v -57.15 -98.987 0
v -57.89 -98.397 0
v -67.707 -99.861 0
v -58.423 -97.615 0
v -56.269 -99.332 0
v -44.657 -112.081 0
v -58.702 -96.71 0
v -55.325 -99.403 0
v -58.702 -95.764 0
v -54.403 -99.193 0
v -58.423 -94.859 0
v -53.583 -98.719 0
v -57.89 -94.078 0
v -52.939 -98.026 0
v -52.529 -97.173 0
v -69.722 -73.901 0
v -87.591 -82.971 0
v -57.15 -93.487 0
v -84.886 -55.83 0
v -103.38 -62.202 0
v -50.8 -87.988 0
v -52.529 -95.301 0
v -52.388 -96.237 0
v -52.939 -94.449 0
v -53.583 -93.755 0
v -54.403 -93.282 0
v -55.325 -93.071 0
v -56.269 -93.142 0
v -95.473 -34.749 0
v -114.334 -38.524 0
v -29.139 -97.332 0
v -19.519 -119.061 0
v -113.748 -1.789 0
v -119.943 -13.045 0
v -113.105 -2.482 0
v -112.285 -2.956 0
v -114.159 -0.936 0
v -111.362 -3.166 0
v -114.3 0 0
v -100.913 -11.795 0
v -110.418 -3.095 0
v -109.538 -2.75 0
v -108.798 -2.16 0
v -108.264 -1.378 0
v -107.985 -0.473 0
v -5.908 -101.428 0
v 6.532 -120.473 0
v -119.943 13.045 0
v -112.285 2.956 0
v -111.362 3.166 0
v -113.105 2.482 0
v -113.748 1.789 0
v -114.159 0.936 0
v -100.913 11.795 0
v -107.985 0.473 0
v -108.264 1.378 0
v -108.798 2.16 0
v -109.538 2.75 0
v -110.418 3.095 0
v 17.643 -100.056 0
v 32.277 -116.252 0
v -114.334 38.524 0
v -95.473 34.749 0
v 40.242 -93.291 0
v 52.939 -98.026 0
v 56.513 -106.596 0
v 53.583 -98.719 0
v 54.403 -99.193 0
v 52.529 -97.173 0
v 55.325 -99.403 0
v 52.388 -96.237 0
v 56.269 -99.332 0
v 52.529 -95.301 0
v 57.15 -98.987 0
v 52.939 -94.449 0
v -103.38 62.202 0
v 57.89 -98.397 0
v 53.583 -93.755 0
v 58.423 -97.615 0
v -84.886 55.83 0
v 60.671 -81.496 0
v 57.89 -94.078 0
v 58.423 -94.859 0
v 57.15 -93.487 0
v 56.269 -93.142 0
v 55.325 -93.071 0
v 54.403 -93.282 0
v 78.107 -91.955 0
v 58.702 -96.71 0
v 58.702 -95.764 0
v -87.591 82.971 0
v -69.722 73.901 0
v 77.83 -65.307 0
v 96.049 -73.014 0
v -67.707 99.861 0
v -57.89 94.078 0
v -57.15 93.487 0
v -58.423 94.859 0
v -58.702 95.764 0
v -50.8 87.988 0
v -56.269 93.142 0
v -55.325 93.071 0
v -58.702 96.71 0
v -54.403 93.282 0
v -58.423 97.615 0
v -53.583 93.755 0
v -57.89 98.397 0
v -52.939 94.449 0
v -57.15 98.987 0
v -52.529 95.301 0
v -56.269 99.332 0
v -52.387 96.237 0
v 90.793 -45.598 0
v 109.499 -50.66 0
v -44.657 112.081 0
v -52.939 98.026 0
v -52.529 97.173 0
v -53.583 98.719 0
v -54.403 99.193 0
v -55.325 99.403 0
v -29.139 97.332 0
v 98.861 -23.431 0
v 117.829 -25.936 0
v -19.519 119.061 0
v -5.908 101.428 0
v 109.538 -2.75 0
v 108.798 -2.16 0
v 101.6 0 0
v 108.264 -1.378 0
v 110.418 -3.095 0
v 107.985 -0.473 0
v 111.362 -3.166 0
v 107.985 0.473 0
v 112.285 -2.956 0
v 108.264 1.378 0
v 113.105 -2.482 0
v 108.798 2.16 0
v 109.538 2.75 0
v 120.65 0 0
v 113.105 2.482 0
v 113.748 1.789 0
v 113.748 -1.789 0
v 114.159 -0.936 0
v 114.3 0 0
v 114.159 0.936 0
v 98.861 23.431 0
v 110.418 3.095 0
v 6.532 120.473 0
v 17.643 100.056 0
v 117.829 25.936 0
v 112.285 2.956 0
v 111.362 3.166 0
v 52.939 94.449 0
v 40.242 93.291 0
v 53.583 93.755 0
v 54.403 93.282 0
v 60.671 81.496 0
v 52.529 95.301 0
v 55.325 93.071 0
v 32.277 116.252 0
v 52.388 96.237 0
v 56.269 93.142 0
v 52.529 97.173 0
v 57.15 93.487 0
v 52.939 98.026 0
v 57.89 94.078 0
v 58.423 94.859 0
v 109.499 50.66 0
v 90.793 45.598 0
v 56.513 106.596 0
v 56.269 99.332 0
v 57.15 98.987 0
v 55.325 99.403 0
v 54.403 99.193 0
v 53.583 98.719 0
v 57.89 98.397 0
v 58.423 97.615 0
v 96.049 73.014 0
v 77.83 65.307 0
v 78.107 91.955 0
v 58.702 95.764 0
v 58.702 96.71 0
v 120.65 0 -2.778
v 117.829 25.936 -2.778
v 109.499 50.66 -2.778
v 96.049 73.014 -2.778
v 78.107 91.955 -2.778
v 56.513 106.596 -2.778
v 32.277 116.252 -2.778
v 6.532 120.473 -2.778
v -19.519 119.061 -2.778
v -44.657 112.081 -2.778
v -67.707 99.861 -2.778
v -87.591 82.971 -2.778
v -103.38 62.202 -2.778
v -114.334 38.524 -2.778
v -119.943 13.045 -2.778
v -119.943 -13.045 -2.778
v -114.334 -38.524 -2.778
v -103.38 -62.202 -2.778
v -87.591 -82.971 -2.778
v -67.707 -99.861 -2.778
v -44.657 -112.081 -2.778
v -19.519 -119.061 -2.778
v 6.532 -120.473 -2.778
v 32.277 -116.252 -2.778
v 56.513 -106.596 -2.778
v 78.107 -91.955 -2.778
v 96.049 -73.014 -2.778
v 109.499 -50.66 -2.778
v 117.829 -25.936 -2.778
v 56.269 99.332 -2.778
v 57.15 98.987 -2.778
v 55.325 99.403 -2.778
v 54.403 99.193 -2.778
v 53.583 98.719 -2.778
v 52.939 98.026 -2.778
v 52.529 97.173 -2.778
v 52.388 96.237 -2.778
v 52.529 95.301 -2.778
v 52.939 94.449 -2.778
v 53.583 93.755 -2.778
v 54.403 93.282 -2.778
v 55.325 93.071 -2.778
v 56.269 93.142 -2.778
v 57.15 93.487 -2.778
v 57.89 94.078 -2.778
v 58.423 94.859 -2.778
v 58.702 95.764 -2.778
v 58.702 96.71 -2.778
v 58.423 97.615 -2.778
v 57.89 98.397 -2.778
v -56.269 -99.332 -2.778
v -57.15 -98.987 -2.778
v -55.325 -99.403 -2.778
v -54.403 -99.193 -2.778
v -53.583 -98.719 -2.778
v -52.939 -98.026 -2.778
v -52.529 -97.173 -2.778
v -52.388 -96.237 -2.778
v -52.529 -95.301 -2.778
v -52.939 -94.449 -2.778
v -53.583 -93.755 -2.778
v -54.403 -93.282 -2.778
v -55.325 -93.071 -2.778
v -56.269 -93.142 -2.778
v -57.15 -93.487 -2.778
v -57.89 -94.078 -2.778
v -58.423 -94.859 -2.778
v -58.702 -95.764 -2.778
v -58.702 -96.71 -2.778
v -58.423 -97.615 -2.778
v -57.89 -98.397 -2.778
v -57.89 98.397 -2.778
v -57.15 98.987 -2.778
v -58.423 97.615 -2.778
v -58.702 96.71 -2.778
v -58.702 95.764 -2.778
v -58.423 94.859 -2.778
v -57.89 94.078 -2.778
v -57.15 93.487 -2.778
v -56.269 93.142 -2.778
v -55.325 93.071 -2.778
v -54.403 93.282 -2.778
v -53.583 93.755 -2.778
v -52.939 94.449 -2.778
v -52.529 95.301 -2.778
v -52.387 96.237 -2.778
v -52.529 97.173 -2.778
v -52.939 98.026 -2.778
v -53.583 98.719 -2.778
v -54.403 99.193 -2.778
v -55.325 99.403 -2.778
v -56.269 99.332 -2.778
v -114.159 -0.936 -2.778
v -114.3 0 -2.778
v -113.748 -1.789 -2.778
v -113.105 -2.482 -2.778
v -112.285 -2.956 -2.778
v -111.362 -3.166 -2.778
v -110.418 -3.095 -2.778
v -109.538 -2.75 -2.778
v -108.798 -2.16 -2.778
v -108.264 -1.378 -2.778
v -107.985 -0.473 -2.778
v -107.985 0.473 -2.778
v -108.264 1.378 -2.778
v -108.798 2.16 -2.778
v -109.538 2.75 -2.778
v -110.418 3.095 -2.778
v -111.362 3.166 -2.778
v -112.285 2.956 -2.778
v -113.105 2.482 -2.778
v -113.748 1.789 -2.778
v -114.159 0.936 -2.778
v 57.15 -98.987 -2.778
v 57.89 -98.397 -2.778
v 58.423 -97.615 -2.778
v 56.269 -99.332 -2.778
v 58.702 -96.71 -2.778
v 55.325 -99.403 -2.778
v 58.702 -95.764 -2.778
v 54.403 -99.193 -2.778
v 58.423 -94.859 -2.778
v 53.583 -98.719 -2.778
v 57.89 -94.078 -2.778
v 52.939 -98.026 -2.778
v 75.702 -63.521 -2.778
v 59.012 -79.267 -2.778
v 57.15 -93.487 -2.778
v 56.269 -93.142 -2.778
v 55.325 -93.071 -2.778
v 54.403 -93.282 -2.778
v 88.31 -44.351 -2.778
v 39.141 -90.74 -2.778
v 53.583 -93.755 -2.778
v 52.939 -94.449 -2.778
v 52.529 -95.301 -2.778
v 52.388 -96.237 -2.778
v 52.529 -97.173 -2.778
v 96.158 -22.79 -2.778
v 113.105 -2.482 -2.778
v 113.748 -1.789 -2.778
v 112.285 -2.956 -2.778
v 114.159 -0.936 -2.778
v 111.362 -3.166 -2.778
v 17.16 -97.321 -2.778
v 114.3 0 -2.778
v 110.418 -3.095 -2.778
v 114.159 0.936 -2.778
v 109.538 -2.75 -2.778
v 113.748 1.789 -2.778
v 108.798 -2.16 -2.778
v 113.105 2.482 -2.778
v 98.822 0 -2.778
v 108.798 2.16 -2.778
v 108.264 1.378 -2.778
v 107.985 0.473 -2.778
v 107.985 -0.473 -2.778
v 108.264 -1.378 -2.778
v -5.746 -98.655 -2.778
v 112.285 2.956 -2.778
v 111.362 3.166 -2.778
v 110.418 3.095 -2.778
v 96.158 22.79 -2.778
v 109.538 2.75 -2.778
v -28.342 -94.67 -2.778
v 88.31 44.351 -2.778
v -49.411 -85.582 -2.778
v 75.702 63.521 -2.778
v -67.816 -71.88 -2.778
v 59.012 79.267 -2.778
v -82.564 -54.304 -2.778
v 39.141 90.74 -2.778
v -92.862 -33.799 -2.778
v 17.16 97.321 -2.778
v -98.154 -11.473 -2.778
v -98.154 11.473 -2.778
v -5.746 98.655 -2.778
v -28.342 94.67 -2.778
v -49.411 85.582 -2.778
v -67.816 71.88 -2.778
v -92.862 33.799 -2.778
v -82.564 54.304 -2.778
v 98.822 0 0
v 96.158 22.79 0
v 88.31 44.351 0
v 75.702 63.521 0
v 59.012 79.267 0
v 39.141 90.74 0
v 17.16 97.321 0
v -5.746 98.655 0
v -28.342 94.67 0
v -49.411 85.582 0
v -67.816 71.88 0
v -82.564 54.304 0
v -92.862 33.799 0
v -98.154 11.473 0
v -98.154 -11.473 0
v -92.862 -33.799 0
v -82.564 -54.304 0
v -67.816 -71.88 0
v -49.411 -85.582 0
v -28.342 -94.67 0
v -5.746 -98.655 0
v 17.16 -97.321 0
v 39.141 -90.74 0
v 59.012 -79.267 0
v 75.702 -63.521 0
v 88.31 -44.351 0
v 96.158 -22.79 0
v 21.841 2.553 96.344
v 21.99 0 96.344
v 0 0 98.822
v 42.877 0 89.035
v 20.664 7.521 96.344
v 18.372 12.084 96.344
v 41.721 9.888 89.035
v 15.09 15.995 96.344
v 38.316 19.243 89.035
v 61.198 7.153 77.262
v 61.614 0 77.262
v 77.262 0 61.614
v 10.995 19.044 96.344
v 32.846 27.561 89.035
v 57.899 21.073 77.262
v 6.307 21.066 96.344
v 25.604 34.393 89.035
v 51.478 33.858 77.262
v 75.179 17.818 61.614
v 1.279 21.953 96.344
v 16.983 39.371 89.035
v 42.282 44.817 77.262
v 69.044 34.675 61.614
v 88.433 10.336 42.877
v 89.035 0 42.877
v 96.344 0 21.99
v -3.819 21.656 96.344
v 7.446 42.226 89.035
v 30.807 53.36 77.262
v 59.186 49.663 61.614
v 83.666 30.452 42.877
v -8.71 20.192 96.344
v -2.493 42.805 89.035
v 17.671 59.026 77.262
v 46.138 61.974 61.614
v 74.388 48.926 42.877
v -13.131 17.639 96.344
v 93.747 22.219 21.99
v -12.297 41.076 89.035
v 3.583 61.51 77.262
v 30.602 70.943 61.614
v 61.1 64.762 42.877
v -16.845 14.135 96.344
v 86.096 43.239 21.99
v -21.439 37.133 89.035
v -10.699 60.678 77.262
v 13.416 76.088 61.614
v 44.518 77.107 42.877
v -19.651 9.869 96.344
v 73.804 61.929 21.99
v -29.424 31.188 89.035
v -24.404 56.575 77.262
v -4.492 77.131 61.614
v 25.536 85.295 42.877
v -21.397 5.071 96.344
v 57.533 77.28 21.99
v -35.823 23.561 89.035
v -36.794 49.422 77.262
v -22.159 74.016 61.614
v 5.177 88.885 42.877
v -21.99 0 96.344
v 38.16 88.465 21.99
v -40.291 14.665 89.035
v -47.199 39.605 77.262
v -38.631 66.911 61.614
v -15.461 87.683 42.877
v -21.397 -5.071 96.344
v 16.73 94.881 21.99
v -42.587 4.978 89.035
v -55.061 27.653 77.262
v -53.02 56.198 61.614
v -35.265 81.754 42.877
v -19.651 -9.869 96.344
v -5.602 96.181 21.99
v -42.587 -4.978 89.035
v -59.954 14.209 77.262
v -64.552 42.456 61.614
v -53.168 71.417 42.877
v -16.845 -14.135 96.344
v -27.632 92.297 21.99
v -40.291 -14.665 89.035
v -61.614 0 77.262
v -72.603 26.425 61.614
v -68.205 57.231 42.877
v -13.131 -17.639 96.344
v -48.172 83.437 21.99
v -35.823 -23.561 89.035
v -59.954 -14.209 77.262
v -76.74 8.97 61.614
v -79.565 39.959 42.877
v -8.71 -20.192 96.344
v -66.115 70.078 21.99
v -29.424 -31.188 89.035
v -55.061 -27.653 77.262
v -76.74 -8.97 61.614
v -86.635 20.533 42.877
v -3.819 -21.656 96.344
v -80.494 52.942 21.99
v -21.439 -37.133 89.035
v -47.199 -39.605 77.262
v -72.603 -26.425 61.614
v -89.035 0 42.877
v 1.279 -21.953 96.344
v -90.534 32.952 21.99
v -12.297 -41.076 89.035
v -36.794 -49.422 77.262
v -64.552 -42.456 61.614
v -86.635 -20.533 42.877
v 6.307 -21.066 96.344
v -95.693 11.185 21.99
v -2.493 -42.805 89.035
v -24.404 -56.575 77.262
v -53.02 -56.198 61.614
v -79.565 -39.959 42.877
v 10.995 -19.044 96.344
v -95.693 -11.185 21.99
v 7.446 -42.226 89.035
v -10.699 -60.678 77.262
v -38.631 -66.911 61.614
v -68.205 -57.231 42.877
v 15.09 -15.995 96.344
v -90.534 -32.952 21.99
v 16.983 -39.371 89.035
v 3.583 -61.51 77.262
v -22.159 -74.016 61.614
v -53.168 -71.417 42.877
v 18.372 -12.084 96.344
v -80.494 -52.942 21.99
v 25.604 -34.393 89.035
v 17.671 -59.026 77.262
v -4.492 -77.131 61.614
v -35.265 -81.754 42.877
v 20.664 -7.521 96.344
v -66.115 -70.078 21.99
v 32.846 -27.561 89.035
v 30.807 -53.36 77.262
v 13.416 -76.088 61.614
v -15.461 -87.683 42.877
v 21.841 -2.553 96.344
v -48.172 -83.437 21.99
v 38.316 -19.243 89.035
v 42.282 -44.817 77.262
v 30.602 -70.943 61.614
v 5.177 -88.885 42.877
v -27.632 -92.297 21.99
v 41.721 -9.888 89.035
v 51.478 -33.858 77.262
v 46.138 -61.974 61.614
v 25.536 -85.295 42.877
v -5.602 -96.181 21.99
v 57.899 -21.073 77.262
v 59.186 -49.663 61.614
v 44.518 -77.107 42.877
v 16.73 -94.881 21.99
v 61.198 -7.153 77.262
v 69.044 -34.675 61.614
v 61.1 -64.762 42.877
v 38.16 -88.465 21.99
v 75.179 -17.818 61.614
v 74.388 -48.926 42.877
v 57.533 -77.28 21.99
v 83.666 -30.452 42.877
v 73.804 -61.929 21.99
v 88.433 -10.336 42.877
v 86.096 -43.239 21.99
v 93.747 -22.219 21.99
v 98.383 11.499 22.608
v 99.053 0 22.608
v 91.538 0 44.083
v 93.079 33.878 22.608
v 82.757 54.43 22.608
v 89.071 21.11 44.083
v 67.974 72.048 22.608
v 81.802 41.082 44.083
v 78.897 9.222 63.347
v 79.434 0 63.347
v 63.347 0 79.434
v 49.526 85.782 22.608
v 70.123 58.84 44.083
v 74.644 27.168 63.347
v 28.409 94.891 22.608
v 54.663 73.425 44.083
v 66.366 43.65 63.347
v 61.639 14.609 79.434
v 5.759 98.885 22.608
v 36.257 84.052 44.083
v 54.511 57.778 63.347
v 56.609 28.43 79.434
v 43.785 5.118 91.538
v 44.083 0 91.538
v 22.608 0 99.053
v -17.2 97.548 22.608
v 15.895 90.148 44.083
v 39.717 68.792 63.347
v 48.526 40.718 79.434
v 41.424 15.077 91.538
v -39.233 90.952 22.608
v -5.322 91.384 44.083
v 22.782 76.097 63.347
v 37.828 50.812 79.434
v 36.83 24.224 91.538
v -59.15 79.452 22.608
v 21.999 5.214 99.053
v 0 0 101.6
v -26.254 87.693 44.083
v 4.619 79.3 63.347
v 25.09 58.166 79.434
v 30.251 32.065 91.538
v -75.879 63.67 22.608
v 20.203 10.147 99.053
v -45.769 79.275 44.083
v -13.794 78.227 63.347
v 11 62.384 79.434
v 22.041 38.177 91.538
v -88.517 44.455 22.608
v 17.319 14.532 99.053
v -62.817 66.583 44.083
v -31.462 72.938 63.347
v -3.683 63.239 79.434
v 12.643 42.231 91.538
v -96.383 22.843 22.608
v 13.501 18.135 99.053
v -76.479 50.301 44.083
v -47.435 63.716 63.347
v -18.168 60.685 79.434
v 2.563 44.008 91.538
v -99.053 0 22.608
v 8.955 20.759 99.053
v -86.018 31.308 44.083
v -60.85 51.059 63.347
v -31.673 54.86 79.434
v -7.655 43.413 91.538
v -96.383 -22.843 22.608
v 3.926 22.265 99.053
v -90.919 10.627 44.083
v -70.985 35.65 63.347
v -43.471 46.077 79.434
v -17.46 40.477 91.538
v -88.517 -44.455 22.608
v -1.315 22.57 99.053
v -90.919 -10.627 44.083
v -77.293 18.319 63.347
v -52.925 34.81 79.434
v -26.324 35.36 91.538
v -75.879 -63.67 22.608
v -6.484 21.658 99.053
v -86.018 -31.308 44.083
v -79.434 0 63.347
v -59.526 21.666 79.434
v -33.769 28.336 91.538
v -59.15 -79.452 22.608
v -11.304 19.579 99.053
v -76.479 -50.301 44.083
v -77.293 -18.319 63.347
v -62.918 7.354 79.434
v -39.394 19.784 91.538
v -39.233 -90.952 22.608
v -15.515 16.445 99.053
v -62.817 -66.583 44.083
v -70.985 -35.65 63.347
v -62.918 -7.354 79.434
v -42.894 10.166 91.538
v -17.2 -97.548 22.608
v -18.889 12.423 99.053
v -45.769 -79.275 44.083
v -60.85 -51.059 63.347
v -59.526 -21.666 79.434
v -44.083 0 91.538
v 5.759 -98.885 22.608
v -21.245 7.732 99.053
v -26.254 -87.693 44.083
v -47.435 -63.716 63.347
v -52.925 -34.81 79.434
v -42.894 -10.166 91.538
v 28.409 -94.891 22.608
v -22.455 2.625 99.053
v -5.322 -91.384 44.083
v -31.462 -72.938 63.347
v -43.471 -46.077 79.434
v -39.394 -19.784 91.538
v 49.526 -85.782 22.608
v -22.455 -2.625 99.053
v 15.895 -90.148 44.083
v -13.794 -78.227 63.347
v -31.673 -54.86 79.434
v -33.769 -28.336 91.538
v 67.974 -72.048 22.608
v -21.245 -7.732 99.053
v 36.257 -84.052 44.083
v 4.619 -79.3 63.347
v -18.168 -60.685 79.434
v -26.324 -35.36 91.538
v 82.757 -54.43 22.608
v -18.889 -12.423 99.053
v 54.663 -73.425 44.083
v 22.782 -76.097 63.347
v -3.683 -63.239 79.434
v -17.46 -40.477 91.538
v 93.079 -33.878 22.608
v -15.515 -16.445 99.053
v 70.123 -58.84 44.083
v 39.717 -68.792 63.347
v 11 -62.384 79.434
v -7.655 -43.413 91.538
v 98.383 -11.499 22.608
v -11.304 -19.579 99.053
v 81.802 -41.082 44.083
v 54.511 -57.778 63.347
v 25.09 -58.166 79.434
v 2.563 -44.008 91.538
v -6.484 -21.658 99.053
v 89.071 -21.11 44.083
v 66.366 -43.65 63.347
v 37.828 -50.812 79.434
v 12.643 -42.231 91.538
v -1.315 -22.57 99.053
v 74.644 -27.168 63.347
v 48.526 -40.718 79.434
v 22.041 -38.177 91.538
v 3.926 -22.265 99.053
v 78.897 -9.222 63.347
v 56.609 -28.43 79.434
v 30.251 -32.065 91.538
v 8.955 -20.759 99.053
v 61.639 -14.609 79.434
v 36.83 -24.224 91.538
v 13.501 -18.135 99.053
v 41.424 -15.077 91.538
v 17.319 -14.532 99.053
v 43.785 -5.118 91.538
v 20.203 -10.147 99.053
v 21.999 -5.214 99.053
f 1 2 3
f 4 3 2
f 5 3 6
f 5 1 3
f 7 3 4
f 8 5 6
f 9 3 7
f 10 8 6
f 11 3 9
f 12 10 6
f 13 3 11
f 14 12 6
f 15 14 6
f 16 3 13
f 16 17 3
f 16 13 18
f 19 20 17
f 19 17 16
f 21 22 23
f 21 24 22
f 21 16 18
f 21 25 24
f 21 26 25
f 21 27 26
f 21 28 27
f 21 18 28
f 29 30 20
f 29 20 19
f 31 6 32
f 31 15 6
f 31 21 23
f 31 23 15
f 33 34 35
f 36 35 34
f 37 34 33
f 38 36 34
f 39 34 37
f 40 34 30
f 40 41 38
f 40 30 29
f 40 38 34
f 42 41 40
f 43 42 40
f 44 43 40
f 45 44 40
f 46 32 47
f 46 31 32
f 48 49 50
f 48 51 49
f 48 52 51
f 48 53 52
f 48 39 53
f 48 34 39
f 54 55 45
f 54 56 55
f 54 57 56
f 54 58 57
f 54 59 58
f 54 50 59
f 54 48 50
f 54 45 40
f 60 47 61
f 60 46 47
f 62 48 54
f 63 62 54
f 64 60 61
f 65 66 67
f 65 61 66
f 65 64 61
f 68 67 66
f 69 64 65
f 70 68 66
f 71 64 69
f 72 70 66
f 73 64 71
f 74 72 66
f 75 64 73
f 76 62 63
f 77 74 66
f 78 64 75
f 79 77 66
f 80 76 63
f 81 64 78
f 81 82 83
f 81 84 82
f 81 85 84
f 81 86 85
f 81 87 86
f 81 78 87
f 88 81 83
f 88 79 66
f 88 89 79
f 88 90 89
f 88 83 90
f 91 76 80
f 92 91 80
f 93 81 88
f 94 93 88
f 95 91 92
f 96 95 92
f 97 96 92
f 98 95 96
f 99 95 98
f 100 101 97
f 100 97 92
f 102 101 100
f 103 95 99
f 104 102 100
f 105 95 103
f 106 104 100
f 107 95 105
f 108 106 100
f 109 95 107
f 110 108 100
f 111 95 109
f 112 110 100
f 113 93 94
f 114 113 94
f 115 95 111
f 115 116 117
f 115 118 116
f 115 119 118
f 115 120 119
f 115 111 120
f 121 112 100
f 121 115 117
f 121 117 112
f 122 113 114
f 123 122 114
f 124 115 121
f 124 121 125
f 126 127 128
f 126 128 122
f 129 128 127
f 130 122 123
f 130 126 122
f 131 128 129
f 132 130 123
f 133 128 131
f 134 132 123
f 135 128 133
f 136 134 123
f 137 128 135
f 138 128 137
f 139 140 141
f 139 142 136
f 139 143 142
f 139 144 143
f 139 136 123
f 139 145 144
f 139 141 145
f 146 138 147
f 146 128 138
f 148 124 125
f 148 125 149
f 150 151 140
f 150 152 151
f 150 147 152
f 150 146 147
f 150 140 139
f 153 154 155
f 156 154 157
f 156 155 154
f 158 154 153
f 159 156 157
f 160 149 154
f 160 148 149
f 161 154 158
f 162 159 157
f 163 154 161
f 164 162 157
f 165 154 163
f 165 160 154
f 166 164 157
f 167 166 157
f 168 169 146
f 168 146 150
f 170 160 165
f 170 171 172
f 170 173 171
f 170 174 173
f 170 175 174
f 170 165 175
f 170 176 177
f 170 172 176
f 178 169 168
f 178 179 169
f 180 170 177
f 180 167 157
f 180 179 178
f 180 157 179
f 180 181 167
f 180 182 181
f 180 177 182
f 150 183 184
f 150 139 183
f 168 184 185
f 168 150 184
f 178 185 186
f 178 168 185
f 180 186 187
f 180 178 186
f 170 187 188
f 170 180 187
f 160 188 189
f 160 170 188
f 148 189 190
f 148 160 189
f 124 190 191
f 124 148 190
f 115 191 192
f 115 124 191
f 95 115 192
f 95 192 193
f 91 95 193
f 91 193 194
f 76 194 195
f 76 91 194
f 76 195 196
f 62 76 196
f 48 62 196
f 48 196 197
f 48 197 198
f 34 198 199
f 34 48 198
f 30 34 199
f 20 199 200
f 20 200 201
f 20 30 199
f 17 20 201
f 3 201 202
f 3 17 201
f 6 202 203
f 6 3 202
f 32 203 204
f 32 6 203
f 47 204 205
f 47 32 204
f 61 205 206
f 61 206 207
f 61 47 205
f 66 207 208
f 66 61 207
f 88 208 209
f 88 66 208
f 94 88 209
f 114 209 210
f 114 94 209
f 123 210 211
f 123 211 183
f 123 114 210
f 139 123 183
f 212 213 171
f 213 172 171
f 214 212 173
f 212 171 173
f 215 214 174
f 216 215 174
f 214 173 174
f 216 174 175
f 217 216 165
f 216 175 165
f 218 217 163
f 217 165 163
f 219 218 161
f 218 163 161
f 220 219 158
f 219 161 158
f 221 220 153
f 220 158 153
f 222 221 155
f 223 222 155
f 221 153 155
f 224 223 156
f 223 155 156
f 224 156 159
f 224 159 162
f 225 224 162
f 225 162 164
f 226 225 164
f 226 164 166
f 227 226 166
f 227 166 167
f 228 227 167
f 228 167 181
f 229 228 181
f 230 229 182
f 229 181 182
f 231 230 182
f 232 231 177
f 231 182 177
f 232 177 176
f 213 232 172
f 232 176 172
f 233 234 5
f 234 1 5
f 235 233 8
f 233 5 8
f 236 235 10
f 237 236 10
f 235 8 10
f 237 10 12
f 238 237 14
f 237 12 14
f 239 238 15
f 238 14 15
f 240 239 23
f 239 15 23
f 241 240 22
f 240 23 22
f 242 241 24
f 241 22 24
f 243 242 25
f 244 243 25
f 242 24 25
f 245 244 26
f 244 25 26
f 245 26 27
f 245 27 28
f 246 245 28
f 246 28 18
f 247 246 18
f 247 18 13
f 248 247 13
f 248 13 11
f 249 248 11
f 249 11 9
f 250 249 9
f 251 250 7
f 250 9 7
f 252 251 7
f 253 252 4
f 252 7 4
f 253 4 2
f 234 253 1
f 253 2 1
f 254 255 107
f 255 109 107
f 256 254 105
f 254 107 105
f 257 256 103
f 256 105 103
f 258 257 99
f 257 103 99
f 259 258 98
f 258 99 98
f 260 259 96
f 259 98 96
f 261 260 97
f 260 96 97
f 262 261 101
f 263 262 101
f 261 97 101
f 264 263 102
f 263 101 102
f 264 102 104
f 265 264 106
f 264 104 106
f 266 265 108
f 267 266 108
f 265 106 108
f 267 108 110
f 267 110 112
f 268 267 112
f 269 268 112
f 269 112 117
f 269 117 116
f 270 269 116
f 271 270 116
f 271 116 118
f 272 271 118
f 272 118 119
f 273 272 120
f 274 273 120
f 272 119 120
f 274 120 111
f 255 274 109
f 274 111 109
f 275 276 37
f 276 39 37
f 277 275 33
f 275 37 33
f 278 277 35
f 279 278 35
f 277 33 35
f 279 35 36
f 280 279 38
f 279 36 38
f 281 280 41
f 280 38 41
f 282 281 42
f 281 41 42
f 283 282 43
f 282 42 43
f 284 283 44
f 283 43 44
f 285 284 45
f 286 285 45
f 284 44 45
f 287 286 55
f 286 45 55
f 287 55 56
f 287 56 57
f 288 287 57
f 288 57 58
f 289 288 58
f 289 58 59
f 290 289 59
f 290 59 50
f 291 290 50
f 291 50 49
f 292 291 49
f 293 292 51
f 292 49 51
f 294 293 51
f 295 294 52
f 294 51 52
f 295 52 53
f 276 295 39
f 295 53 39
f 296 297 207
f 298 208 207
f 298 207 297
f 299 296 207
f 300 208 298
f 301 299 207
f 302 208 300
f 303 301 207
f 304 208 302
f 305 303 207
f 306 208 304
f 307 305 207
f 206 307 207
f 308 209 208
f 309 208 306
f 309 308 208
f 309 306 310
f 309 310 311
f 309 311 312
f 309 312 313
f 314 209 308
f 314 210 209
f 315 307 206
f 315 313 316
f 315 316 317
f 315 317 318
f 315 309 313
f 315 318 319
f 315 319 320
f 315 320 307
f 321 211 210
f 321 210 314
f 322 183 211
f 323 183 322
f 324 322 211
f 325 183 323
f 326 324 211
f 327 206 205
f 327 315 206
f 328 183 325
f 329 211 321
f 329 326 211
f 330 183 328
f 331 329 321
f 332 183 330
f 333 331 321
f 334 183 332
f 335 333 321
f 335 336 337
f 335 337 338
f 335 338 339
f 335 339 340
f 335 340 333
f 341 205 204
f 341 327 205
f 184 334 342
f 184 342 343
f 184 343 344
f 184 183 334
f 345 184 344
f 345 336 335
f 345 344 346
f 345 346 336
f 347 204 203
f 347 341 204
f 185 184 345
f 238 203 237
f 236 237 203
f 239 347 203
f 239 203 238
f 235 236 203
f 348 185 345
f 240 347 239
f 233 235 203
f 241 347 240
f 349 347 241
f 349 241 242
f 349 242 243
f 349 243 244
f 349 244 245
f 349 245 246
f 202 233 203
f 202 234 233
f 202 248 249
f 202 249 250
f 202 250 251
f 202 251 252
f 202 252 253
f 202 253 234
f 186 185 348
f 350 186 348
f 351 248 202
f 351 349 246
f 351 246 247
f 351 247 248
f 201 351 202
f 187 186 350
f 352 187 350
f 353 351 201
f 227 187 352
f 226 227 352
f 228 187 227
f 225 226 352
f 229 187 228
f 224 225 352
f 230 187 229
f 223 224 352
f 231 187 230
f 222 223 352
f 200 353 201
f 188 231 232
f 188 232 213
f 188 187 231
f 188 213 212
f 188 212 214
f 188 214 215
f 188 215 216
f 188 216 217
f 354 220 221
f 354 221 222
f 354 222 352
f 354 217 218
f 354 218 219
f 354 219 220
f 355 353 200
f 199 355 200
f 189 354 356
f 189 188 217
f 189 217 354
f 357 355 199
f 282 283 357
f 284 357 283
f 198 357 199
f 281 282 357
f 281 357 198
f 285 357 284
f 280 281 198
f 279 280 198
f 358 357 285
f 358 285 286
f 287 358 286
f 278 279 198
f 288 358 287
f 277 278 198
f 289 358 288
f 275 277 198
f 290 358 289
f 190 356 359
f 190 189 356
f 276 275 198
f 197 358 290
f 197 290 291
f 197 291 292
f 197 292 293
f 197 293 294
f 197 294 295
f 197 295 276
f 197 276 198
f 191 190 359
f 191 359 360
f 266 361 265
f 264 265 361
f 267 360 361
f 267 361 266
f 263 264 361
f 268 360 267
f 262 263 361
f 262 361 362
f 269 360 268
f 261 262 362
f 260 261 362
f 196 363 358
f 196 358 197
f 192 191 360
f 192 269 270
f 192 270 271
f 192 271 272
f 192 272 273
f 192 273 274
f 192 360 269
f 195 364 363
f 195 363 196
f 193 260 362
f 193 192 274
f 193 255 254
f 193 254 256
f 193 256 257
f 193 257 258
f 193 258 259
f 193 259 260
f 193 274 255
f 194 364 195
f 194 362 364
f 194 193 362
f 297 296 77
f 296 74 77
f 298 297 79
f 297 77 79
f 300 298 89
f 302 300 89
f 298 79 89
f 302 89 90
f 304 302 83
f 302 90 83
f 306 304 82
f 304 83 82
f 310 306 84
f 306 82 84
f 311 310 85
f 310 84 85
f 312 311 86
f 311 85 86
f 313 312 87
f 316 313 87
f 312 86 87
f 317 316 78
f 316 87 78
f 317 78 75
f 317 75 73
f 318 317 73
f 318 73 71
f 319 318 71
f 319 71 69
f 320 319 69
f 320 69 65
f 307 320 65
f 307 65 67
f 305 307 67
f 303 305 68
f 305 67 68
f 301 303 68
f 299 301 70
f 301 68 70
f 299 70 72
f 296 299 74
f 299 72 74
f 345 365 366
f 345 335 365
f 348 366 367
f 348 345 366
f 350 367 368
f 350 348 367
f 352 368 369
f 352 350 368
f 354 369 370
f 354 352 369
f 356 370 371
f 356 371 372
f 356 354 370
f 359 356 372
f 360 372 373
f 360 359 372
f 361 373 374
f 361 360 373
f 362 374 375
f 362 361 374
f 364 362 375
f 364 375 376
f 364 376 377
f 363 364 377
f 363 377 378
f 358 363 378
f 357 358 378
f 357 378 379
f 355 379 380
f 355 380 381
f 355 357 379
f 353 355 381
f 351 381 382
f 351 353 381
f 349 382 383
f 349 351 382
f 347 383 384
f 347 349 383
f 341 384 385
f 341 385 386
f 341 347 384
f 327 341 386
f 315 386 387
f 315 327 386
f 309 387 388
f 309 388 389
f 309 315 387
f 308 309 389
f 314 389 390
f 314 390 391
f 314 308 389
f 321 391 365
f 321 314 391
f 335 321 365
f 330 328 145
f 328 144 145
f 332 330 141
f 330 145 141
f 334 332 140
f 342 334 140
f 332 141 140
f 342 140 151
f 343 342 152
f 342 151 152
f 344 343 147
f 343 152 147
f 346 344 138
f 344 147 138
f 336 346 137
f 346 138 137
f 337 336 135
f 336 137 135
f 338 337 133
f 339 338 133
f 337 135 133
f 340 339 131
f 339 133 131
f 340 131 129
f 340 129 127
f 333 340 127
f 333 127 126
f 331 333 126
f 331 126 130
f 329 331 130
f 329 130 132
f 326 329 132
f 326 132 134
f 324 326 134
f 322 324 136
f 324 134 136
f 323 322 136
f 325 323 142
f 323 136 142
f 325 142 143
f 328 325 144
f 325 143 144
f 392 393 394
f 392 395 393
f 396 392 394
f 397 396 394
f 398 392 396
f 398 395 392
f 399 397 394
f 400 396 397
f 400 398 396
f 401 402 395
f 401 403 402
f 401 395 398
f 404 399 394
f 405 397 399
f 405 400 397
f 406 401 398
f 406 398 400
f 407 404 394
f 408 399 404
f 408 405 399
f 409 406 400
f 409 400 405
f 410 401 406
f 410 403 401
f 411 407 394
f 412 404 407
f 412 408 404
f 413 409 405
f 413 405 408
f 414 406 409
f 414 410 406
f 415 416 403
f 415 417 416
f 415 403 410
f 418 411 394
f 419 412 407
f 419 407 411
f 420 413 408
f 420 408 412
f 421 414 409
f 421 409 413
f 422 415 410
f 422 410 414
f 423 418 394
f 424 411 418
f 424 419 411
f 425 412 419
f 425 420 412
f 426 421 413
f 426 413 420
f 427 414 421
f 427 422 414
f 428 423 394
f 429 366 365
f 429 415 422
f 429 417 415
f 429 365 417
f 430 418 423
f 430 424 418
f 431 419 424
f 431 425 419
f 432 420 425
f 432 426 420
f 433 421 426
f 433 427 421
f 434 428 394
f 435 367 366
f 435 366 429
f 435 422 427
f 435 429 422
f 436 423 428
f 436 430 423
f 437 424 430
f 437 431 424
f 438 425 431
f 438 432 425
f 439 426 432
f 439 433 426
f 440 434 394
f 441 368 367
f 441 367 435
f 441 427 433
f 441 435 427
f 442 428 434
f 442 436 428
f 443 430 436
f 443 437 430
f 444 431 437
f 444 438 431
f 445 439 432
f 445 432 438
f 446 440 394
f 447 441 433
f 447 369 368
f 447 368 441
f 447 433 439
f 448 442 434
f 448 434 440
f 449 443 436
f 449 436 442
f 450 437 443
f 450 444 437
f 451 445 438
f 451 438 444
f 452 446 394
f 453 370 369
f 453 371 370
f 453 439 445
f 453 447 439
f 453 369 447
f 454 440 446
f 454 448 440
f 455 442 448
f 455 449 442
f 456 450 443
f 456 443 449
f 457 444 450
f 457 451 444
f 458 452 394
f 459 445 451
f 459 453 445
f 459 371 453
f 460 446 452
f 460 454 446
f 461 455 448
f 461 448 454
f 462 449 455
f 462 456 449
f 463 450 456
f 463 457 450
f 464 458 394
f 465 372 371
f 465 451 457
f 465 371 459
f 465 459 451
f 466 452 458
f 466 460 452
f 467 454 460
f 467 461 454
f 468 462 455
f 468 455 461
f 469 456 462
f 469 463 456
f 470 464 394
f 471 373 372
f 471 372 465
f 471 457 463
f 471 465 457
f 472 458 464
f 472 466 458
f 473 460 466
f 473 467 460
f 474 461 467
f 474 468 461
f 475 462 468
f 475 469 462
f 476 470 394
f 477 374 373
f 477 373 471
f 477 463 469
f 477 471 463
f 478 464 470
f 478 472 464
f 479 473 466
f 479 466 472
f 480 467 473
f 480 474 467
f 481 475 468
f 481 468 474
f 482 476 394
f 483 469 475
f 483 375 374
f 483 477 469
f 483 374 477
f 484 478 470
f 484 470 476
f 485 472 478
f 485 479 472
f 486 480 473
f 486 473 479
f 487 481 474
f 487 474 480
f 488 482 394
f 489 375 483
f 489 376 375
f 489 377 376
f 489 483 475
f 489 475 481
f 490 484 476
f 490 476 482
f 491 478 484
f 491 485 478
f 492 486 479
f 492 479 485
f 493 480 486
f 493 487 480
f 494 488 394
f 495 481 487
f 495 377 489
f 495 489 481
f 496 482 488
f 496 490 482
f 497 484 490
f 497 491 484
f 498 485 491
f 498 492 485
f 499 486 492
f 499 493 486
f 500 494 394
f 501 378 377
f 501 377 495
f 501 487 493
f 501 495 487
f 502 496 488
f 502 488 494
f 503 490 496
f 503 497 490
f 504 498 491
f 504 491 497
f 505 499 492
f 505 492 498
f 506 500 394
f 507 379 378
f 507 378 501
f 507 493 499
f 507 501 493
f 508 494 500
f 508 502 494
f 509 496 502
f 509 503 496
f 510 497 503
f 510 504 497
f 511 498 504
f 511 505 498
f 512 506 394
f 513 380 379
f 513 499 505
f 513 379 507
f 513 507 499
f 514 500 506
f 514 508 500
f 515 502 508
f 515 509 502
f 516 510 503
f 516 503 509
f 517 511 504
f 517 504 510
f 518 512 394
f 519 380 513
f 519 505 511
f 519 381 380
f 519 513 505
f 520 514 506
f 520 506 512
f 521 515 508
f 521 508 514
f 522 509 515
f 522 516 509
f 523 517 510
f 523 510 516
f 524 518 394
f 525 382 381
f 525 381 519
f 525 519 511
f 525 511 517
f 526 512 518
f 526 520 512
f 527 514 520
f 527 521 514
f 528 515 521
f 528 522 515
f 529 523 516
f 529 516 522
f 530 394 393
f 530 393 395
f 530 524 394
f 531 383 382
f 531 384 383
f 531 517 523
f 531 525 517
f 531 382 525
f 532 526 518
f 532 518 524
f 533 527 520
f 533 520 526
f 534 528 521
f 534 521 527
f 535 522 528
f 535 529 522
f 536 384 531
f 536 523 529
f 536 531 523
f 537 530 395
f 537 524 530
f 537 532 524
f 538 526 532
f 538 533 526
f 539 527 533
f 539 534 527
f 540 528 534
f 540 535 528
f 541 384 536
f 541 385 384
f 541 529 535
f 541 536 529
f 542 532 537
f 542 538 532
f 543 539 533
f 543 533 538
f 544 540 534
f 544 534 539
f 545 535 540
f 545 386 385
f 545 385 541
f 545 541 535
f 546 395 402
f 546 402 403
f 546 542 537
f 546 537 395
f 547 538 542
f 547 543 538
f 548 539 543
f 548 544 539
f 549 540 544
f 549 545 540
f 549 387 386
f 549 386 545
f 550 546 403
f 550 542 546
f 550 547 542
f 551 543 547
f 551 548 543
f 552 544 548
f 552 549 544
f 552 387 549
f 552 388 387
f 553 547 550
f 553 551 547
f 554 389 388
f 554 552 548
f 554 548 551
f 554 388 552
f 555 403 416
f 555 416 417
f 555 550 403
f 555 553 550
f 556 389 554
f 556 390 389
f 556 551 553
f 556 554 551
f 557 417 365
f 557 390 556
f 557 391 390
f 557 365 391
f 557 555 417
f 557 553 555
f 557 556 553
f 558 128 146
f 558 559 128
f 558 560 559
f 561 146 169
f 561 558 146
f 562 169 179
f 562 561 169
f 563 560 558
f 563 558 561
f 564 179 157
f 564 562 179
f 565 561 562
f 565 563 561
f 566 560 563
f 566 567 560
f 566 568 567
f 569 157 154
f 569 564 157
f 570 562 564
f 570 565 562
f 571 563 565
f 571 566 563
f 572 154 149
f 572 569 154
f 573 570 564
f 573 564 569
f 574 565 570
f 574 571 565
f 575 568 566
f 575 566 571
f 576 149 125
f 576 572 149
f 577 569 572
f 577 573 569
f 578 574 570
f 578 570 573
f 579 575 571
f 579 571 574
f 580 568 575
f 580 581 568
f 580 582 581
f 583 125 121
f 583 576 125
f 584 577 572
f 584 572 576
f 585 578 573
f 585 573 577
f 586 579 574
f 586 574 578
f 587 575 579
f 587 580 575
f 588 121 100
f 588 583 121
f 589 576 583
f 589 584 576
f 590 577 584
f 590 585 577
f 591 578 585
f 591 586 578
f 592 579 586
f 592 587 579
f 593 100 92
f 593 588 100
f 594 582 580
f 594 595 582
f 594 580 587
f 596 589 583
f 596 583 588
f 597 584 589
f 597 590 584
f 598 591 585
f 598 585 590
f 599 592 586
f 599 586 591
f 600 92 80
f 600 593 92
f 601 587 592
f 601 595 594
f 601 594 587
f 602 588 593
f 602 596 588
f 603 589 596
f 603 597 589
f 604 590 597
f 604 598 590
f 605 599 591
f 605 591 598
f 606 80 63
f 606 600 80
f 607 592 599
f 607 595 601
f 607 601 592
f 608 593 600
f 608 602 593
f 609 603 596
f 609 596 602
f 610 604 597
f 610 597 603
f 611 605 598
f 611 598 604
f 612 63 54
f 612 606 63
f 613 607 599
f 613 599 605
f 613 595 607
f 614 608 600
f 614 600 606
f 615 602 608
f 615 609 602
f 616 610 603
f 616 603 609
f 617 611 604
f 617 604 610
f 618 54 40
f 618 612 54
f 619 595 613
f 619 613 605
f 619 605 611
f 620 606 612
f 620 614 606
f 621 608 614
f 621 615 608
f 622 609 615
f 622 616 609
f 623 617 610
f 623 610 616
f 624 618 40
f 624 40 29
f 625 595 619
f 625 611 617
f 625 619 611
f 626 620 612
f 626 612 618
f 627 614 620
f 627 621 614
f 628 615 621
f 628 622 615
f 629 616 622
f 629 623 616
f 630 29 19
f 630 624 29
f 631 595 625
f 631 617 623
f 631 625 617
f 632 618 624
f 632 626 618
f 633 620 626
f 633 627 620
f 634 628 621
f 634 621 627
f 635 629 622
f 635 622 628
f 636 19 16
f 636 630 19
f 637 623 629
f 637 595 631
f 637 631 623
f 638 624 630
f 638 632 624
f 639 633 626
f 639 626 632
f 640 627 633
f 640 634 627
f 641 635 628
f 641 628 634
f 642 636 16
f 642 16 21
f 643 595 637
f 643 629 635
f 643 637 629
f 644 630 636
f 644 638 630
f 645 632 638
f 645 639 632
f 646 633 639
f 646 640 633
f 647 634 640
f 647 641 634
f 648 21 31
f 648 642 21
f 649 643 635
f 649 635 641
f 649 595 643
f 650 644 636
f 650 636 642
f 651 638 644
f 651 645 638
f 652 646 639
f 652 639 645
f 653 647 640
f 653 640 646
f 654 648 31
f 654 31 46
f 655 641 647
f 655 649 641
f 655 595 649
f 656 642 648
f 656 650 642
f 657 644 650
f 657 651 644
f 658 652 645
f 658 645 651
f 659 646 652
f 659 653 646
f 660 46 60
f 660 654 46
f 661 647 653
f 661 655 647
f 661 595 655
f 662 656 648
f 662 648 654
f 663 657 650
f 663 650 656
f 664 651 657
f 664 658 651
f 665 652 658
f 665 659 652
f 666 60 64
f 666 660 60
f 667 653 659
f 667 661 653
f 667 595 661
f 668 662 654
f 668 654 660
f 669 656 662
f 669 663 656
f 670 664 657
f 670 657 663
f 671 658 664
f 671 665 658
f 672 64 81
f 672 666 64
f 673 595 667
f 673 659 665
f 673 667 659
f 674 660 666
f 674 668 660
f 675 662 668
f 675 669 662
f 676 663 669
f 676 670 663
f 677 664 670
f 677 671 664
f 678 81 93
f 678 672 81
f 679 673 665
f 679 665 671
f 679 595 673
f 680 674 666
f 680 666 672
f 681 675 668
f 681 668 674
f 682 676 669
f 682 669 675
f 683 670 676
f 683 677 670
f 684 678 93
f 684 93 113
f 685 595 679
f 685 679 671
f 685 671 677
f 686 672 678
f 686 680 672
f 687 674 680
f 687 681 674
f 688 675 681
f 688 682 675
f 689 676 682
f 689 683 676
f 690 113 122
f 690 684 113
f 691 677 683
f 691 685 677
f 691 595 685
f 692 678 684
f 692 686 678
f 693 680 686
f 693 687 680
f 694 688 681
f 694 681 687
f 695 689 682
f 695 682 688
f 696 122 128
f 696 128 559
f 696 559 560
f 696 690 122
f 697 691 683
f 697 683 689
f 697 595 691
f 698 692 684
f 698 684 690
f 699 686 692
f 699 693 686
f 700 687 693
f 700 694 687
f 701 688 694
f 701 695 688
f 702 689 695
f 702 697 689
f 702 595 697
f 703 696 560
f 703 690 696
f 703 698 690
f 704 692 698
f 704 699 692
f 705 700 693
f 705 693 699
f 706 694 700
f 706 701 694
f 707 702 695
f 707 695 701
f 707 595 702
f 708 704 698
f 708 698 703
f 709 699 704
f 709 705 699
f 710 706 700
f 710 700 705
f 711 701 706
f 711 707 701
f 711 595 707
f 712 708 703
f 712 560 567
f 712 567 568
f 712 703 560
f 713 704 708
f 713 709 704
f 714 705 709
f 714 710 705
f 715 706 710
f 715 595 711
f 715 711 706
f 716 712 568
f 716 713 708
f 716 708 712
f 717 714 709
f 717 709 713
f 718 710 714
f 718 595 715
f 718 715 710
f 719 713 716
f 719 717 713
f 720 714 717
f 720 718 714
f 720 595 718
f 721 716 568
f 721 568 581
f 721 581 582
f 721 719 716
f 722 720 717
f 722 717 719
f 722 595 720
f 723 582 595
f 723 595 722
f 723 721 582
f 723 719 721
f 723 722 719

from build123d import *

# Parameters (mm, degrees)
SKETCH2_R          = 3.175
CUT_EXTRUDE1_DEPTH = 199.583496293
CIRPATTERN1_COUNT  = 6


with BuildPart() as part:
    # Sketch1 → Revolve1 (revolve)
    with BuildSketch(Plane(origin=(0, 0, 0), x_dir=(1, 0, 0), z_dir=(0, 1, 0))):
        with BuildLine():
            Line((98.821875, 0), (98.821875, 2.778125))
            Line((98.821875, 2.778125), (120.65, 2.778125))
            Line((120.65, 2.778125), (120.65, 0))
            Line((120.65, 0), (101.6, 0))
            ThreePointArc((101.6, 0), (71.842048969, -71.842048969), (0, -101.6))
            Line((0, -101.6), (0, -98.821875))
            ThreePointArc((0, -98.821875), (69.877617942, -69.877617942), (98.821875, 0))
        make_face()
    revolve(axis=Axis((0, 0, 0), (0, 0, 1)))

    # Sketch2 → Cut-Extrude1 (cut, symmetric)
    with BuildSketch(Plane.XY):
        with Locations((111.125, 0)):
            Circle(SKETCH2_R)
    cut_extrude1 = extrude(amount=CUT_EXTRUDE1_DEPTH, both=True, mode=Mode.SUBTRACT)

    # CirPattern1: Cut-Extrude1 ×6 about axis
    cirpattern1_axis = Axis((0, 0, -6.72703125), (0, 0, 1))
    for i in range(1, CIRPATTERN1_COUNT):
        add(cut_extrude1.rotate(cirpattern1_axis, i * 360 / CIRPATTERN1_COUNT), mode=Mode.SUBTRACT)


solid = part.part
